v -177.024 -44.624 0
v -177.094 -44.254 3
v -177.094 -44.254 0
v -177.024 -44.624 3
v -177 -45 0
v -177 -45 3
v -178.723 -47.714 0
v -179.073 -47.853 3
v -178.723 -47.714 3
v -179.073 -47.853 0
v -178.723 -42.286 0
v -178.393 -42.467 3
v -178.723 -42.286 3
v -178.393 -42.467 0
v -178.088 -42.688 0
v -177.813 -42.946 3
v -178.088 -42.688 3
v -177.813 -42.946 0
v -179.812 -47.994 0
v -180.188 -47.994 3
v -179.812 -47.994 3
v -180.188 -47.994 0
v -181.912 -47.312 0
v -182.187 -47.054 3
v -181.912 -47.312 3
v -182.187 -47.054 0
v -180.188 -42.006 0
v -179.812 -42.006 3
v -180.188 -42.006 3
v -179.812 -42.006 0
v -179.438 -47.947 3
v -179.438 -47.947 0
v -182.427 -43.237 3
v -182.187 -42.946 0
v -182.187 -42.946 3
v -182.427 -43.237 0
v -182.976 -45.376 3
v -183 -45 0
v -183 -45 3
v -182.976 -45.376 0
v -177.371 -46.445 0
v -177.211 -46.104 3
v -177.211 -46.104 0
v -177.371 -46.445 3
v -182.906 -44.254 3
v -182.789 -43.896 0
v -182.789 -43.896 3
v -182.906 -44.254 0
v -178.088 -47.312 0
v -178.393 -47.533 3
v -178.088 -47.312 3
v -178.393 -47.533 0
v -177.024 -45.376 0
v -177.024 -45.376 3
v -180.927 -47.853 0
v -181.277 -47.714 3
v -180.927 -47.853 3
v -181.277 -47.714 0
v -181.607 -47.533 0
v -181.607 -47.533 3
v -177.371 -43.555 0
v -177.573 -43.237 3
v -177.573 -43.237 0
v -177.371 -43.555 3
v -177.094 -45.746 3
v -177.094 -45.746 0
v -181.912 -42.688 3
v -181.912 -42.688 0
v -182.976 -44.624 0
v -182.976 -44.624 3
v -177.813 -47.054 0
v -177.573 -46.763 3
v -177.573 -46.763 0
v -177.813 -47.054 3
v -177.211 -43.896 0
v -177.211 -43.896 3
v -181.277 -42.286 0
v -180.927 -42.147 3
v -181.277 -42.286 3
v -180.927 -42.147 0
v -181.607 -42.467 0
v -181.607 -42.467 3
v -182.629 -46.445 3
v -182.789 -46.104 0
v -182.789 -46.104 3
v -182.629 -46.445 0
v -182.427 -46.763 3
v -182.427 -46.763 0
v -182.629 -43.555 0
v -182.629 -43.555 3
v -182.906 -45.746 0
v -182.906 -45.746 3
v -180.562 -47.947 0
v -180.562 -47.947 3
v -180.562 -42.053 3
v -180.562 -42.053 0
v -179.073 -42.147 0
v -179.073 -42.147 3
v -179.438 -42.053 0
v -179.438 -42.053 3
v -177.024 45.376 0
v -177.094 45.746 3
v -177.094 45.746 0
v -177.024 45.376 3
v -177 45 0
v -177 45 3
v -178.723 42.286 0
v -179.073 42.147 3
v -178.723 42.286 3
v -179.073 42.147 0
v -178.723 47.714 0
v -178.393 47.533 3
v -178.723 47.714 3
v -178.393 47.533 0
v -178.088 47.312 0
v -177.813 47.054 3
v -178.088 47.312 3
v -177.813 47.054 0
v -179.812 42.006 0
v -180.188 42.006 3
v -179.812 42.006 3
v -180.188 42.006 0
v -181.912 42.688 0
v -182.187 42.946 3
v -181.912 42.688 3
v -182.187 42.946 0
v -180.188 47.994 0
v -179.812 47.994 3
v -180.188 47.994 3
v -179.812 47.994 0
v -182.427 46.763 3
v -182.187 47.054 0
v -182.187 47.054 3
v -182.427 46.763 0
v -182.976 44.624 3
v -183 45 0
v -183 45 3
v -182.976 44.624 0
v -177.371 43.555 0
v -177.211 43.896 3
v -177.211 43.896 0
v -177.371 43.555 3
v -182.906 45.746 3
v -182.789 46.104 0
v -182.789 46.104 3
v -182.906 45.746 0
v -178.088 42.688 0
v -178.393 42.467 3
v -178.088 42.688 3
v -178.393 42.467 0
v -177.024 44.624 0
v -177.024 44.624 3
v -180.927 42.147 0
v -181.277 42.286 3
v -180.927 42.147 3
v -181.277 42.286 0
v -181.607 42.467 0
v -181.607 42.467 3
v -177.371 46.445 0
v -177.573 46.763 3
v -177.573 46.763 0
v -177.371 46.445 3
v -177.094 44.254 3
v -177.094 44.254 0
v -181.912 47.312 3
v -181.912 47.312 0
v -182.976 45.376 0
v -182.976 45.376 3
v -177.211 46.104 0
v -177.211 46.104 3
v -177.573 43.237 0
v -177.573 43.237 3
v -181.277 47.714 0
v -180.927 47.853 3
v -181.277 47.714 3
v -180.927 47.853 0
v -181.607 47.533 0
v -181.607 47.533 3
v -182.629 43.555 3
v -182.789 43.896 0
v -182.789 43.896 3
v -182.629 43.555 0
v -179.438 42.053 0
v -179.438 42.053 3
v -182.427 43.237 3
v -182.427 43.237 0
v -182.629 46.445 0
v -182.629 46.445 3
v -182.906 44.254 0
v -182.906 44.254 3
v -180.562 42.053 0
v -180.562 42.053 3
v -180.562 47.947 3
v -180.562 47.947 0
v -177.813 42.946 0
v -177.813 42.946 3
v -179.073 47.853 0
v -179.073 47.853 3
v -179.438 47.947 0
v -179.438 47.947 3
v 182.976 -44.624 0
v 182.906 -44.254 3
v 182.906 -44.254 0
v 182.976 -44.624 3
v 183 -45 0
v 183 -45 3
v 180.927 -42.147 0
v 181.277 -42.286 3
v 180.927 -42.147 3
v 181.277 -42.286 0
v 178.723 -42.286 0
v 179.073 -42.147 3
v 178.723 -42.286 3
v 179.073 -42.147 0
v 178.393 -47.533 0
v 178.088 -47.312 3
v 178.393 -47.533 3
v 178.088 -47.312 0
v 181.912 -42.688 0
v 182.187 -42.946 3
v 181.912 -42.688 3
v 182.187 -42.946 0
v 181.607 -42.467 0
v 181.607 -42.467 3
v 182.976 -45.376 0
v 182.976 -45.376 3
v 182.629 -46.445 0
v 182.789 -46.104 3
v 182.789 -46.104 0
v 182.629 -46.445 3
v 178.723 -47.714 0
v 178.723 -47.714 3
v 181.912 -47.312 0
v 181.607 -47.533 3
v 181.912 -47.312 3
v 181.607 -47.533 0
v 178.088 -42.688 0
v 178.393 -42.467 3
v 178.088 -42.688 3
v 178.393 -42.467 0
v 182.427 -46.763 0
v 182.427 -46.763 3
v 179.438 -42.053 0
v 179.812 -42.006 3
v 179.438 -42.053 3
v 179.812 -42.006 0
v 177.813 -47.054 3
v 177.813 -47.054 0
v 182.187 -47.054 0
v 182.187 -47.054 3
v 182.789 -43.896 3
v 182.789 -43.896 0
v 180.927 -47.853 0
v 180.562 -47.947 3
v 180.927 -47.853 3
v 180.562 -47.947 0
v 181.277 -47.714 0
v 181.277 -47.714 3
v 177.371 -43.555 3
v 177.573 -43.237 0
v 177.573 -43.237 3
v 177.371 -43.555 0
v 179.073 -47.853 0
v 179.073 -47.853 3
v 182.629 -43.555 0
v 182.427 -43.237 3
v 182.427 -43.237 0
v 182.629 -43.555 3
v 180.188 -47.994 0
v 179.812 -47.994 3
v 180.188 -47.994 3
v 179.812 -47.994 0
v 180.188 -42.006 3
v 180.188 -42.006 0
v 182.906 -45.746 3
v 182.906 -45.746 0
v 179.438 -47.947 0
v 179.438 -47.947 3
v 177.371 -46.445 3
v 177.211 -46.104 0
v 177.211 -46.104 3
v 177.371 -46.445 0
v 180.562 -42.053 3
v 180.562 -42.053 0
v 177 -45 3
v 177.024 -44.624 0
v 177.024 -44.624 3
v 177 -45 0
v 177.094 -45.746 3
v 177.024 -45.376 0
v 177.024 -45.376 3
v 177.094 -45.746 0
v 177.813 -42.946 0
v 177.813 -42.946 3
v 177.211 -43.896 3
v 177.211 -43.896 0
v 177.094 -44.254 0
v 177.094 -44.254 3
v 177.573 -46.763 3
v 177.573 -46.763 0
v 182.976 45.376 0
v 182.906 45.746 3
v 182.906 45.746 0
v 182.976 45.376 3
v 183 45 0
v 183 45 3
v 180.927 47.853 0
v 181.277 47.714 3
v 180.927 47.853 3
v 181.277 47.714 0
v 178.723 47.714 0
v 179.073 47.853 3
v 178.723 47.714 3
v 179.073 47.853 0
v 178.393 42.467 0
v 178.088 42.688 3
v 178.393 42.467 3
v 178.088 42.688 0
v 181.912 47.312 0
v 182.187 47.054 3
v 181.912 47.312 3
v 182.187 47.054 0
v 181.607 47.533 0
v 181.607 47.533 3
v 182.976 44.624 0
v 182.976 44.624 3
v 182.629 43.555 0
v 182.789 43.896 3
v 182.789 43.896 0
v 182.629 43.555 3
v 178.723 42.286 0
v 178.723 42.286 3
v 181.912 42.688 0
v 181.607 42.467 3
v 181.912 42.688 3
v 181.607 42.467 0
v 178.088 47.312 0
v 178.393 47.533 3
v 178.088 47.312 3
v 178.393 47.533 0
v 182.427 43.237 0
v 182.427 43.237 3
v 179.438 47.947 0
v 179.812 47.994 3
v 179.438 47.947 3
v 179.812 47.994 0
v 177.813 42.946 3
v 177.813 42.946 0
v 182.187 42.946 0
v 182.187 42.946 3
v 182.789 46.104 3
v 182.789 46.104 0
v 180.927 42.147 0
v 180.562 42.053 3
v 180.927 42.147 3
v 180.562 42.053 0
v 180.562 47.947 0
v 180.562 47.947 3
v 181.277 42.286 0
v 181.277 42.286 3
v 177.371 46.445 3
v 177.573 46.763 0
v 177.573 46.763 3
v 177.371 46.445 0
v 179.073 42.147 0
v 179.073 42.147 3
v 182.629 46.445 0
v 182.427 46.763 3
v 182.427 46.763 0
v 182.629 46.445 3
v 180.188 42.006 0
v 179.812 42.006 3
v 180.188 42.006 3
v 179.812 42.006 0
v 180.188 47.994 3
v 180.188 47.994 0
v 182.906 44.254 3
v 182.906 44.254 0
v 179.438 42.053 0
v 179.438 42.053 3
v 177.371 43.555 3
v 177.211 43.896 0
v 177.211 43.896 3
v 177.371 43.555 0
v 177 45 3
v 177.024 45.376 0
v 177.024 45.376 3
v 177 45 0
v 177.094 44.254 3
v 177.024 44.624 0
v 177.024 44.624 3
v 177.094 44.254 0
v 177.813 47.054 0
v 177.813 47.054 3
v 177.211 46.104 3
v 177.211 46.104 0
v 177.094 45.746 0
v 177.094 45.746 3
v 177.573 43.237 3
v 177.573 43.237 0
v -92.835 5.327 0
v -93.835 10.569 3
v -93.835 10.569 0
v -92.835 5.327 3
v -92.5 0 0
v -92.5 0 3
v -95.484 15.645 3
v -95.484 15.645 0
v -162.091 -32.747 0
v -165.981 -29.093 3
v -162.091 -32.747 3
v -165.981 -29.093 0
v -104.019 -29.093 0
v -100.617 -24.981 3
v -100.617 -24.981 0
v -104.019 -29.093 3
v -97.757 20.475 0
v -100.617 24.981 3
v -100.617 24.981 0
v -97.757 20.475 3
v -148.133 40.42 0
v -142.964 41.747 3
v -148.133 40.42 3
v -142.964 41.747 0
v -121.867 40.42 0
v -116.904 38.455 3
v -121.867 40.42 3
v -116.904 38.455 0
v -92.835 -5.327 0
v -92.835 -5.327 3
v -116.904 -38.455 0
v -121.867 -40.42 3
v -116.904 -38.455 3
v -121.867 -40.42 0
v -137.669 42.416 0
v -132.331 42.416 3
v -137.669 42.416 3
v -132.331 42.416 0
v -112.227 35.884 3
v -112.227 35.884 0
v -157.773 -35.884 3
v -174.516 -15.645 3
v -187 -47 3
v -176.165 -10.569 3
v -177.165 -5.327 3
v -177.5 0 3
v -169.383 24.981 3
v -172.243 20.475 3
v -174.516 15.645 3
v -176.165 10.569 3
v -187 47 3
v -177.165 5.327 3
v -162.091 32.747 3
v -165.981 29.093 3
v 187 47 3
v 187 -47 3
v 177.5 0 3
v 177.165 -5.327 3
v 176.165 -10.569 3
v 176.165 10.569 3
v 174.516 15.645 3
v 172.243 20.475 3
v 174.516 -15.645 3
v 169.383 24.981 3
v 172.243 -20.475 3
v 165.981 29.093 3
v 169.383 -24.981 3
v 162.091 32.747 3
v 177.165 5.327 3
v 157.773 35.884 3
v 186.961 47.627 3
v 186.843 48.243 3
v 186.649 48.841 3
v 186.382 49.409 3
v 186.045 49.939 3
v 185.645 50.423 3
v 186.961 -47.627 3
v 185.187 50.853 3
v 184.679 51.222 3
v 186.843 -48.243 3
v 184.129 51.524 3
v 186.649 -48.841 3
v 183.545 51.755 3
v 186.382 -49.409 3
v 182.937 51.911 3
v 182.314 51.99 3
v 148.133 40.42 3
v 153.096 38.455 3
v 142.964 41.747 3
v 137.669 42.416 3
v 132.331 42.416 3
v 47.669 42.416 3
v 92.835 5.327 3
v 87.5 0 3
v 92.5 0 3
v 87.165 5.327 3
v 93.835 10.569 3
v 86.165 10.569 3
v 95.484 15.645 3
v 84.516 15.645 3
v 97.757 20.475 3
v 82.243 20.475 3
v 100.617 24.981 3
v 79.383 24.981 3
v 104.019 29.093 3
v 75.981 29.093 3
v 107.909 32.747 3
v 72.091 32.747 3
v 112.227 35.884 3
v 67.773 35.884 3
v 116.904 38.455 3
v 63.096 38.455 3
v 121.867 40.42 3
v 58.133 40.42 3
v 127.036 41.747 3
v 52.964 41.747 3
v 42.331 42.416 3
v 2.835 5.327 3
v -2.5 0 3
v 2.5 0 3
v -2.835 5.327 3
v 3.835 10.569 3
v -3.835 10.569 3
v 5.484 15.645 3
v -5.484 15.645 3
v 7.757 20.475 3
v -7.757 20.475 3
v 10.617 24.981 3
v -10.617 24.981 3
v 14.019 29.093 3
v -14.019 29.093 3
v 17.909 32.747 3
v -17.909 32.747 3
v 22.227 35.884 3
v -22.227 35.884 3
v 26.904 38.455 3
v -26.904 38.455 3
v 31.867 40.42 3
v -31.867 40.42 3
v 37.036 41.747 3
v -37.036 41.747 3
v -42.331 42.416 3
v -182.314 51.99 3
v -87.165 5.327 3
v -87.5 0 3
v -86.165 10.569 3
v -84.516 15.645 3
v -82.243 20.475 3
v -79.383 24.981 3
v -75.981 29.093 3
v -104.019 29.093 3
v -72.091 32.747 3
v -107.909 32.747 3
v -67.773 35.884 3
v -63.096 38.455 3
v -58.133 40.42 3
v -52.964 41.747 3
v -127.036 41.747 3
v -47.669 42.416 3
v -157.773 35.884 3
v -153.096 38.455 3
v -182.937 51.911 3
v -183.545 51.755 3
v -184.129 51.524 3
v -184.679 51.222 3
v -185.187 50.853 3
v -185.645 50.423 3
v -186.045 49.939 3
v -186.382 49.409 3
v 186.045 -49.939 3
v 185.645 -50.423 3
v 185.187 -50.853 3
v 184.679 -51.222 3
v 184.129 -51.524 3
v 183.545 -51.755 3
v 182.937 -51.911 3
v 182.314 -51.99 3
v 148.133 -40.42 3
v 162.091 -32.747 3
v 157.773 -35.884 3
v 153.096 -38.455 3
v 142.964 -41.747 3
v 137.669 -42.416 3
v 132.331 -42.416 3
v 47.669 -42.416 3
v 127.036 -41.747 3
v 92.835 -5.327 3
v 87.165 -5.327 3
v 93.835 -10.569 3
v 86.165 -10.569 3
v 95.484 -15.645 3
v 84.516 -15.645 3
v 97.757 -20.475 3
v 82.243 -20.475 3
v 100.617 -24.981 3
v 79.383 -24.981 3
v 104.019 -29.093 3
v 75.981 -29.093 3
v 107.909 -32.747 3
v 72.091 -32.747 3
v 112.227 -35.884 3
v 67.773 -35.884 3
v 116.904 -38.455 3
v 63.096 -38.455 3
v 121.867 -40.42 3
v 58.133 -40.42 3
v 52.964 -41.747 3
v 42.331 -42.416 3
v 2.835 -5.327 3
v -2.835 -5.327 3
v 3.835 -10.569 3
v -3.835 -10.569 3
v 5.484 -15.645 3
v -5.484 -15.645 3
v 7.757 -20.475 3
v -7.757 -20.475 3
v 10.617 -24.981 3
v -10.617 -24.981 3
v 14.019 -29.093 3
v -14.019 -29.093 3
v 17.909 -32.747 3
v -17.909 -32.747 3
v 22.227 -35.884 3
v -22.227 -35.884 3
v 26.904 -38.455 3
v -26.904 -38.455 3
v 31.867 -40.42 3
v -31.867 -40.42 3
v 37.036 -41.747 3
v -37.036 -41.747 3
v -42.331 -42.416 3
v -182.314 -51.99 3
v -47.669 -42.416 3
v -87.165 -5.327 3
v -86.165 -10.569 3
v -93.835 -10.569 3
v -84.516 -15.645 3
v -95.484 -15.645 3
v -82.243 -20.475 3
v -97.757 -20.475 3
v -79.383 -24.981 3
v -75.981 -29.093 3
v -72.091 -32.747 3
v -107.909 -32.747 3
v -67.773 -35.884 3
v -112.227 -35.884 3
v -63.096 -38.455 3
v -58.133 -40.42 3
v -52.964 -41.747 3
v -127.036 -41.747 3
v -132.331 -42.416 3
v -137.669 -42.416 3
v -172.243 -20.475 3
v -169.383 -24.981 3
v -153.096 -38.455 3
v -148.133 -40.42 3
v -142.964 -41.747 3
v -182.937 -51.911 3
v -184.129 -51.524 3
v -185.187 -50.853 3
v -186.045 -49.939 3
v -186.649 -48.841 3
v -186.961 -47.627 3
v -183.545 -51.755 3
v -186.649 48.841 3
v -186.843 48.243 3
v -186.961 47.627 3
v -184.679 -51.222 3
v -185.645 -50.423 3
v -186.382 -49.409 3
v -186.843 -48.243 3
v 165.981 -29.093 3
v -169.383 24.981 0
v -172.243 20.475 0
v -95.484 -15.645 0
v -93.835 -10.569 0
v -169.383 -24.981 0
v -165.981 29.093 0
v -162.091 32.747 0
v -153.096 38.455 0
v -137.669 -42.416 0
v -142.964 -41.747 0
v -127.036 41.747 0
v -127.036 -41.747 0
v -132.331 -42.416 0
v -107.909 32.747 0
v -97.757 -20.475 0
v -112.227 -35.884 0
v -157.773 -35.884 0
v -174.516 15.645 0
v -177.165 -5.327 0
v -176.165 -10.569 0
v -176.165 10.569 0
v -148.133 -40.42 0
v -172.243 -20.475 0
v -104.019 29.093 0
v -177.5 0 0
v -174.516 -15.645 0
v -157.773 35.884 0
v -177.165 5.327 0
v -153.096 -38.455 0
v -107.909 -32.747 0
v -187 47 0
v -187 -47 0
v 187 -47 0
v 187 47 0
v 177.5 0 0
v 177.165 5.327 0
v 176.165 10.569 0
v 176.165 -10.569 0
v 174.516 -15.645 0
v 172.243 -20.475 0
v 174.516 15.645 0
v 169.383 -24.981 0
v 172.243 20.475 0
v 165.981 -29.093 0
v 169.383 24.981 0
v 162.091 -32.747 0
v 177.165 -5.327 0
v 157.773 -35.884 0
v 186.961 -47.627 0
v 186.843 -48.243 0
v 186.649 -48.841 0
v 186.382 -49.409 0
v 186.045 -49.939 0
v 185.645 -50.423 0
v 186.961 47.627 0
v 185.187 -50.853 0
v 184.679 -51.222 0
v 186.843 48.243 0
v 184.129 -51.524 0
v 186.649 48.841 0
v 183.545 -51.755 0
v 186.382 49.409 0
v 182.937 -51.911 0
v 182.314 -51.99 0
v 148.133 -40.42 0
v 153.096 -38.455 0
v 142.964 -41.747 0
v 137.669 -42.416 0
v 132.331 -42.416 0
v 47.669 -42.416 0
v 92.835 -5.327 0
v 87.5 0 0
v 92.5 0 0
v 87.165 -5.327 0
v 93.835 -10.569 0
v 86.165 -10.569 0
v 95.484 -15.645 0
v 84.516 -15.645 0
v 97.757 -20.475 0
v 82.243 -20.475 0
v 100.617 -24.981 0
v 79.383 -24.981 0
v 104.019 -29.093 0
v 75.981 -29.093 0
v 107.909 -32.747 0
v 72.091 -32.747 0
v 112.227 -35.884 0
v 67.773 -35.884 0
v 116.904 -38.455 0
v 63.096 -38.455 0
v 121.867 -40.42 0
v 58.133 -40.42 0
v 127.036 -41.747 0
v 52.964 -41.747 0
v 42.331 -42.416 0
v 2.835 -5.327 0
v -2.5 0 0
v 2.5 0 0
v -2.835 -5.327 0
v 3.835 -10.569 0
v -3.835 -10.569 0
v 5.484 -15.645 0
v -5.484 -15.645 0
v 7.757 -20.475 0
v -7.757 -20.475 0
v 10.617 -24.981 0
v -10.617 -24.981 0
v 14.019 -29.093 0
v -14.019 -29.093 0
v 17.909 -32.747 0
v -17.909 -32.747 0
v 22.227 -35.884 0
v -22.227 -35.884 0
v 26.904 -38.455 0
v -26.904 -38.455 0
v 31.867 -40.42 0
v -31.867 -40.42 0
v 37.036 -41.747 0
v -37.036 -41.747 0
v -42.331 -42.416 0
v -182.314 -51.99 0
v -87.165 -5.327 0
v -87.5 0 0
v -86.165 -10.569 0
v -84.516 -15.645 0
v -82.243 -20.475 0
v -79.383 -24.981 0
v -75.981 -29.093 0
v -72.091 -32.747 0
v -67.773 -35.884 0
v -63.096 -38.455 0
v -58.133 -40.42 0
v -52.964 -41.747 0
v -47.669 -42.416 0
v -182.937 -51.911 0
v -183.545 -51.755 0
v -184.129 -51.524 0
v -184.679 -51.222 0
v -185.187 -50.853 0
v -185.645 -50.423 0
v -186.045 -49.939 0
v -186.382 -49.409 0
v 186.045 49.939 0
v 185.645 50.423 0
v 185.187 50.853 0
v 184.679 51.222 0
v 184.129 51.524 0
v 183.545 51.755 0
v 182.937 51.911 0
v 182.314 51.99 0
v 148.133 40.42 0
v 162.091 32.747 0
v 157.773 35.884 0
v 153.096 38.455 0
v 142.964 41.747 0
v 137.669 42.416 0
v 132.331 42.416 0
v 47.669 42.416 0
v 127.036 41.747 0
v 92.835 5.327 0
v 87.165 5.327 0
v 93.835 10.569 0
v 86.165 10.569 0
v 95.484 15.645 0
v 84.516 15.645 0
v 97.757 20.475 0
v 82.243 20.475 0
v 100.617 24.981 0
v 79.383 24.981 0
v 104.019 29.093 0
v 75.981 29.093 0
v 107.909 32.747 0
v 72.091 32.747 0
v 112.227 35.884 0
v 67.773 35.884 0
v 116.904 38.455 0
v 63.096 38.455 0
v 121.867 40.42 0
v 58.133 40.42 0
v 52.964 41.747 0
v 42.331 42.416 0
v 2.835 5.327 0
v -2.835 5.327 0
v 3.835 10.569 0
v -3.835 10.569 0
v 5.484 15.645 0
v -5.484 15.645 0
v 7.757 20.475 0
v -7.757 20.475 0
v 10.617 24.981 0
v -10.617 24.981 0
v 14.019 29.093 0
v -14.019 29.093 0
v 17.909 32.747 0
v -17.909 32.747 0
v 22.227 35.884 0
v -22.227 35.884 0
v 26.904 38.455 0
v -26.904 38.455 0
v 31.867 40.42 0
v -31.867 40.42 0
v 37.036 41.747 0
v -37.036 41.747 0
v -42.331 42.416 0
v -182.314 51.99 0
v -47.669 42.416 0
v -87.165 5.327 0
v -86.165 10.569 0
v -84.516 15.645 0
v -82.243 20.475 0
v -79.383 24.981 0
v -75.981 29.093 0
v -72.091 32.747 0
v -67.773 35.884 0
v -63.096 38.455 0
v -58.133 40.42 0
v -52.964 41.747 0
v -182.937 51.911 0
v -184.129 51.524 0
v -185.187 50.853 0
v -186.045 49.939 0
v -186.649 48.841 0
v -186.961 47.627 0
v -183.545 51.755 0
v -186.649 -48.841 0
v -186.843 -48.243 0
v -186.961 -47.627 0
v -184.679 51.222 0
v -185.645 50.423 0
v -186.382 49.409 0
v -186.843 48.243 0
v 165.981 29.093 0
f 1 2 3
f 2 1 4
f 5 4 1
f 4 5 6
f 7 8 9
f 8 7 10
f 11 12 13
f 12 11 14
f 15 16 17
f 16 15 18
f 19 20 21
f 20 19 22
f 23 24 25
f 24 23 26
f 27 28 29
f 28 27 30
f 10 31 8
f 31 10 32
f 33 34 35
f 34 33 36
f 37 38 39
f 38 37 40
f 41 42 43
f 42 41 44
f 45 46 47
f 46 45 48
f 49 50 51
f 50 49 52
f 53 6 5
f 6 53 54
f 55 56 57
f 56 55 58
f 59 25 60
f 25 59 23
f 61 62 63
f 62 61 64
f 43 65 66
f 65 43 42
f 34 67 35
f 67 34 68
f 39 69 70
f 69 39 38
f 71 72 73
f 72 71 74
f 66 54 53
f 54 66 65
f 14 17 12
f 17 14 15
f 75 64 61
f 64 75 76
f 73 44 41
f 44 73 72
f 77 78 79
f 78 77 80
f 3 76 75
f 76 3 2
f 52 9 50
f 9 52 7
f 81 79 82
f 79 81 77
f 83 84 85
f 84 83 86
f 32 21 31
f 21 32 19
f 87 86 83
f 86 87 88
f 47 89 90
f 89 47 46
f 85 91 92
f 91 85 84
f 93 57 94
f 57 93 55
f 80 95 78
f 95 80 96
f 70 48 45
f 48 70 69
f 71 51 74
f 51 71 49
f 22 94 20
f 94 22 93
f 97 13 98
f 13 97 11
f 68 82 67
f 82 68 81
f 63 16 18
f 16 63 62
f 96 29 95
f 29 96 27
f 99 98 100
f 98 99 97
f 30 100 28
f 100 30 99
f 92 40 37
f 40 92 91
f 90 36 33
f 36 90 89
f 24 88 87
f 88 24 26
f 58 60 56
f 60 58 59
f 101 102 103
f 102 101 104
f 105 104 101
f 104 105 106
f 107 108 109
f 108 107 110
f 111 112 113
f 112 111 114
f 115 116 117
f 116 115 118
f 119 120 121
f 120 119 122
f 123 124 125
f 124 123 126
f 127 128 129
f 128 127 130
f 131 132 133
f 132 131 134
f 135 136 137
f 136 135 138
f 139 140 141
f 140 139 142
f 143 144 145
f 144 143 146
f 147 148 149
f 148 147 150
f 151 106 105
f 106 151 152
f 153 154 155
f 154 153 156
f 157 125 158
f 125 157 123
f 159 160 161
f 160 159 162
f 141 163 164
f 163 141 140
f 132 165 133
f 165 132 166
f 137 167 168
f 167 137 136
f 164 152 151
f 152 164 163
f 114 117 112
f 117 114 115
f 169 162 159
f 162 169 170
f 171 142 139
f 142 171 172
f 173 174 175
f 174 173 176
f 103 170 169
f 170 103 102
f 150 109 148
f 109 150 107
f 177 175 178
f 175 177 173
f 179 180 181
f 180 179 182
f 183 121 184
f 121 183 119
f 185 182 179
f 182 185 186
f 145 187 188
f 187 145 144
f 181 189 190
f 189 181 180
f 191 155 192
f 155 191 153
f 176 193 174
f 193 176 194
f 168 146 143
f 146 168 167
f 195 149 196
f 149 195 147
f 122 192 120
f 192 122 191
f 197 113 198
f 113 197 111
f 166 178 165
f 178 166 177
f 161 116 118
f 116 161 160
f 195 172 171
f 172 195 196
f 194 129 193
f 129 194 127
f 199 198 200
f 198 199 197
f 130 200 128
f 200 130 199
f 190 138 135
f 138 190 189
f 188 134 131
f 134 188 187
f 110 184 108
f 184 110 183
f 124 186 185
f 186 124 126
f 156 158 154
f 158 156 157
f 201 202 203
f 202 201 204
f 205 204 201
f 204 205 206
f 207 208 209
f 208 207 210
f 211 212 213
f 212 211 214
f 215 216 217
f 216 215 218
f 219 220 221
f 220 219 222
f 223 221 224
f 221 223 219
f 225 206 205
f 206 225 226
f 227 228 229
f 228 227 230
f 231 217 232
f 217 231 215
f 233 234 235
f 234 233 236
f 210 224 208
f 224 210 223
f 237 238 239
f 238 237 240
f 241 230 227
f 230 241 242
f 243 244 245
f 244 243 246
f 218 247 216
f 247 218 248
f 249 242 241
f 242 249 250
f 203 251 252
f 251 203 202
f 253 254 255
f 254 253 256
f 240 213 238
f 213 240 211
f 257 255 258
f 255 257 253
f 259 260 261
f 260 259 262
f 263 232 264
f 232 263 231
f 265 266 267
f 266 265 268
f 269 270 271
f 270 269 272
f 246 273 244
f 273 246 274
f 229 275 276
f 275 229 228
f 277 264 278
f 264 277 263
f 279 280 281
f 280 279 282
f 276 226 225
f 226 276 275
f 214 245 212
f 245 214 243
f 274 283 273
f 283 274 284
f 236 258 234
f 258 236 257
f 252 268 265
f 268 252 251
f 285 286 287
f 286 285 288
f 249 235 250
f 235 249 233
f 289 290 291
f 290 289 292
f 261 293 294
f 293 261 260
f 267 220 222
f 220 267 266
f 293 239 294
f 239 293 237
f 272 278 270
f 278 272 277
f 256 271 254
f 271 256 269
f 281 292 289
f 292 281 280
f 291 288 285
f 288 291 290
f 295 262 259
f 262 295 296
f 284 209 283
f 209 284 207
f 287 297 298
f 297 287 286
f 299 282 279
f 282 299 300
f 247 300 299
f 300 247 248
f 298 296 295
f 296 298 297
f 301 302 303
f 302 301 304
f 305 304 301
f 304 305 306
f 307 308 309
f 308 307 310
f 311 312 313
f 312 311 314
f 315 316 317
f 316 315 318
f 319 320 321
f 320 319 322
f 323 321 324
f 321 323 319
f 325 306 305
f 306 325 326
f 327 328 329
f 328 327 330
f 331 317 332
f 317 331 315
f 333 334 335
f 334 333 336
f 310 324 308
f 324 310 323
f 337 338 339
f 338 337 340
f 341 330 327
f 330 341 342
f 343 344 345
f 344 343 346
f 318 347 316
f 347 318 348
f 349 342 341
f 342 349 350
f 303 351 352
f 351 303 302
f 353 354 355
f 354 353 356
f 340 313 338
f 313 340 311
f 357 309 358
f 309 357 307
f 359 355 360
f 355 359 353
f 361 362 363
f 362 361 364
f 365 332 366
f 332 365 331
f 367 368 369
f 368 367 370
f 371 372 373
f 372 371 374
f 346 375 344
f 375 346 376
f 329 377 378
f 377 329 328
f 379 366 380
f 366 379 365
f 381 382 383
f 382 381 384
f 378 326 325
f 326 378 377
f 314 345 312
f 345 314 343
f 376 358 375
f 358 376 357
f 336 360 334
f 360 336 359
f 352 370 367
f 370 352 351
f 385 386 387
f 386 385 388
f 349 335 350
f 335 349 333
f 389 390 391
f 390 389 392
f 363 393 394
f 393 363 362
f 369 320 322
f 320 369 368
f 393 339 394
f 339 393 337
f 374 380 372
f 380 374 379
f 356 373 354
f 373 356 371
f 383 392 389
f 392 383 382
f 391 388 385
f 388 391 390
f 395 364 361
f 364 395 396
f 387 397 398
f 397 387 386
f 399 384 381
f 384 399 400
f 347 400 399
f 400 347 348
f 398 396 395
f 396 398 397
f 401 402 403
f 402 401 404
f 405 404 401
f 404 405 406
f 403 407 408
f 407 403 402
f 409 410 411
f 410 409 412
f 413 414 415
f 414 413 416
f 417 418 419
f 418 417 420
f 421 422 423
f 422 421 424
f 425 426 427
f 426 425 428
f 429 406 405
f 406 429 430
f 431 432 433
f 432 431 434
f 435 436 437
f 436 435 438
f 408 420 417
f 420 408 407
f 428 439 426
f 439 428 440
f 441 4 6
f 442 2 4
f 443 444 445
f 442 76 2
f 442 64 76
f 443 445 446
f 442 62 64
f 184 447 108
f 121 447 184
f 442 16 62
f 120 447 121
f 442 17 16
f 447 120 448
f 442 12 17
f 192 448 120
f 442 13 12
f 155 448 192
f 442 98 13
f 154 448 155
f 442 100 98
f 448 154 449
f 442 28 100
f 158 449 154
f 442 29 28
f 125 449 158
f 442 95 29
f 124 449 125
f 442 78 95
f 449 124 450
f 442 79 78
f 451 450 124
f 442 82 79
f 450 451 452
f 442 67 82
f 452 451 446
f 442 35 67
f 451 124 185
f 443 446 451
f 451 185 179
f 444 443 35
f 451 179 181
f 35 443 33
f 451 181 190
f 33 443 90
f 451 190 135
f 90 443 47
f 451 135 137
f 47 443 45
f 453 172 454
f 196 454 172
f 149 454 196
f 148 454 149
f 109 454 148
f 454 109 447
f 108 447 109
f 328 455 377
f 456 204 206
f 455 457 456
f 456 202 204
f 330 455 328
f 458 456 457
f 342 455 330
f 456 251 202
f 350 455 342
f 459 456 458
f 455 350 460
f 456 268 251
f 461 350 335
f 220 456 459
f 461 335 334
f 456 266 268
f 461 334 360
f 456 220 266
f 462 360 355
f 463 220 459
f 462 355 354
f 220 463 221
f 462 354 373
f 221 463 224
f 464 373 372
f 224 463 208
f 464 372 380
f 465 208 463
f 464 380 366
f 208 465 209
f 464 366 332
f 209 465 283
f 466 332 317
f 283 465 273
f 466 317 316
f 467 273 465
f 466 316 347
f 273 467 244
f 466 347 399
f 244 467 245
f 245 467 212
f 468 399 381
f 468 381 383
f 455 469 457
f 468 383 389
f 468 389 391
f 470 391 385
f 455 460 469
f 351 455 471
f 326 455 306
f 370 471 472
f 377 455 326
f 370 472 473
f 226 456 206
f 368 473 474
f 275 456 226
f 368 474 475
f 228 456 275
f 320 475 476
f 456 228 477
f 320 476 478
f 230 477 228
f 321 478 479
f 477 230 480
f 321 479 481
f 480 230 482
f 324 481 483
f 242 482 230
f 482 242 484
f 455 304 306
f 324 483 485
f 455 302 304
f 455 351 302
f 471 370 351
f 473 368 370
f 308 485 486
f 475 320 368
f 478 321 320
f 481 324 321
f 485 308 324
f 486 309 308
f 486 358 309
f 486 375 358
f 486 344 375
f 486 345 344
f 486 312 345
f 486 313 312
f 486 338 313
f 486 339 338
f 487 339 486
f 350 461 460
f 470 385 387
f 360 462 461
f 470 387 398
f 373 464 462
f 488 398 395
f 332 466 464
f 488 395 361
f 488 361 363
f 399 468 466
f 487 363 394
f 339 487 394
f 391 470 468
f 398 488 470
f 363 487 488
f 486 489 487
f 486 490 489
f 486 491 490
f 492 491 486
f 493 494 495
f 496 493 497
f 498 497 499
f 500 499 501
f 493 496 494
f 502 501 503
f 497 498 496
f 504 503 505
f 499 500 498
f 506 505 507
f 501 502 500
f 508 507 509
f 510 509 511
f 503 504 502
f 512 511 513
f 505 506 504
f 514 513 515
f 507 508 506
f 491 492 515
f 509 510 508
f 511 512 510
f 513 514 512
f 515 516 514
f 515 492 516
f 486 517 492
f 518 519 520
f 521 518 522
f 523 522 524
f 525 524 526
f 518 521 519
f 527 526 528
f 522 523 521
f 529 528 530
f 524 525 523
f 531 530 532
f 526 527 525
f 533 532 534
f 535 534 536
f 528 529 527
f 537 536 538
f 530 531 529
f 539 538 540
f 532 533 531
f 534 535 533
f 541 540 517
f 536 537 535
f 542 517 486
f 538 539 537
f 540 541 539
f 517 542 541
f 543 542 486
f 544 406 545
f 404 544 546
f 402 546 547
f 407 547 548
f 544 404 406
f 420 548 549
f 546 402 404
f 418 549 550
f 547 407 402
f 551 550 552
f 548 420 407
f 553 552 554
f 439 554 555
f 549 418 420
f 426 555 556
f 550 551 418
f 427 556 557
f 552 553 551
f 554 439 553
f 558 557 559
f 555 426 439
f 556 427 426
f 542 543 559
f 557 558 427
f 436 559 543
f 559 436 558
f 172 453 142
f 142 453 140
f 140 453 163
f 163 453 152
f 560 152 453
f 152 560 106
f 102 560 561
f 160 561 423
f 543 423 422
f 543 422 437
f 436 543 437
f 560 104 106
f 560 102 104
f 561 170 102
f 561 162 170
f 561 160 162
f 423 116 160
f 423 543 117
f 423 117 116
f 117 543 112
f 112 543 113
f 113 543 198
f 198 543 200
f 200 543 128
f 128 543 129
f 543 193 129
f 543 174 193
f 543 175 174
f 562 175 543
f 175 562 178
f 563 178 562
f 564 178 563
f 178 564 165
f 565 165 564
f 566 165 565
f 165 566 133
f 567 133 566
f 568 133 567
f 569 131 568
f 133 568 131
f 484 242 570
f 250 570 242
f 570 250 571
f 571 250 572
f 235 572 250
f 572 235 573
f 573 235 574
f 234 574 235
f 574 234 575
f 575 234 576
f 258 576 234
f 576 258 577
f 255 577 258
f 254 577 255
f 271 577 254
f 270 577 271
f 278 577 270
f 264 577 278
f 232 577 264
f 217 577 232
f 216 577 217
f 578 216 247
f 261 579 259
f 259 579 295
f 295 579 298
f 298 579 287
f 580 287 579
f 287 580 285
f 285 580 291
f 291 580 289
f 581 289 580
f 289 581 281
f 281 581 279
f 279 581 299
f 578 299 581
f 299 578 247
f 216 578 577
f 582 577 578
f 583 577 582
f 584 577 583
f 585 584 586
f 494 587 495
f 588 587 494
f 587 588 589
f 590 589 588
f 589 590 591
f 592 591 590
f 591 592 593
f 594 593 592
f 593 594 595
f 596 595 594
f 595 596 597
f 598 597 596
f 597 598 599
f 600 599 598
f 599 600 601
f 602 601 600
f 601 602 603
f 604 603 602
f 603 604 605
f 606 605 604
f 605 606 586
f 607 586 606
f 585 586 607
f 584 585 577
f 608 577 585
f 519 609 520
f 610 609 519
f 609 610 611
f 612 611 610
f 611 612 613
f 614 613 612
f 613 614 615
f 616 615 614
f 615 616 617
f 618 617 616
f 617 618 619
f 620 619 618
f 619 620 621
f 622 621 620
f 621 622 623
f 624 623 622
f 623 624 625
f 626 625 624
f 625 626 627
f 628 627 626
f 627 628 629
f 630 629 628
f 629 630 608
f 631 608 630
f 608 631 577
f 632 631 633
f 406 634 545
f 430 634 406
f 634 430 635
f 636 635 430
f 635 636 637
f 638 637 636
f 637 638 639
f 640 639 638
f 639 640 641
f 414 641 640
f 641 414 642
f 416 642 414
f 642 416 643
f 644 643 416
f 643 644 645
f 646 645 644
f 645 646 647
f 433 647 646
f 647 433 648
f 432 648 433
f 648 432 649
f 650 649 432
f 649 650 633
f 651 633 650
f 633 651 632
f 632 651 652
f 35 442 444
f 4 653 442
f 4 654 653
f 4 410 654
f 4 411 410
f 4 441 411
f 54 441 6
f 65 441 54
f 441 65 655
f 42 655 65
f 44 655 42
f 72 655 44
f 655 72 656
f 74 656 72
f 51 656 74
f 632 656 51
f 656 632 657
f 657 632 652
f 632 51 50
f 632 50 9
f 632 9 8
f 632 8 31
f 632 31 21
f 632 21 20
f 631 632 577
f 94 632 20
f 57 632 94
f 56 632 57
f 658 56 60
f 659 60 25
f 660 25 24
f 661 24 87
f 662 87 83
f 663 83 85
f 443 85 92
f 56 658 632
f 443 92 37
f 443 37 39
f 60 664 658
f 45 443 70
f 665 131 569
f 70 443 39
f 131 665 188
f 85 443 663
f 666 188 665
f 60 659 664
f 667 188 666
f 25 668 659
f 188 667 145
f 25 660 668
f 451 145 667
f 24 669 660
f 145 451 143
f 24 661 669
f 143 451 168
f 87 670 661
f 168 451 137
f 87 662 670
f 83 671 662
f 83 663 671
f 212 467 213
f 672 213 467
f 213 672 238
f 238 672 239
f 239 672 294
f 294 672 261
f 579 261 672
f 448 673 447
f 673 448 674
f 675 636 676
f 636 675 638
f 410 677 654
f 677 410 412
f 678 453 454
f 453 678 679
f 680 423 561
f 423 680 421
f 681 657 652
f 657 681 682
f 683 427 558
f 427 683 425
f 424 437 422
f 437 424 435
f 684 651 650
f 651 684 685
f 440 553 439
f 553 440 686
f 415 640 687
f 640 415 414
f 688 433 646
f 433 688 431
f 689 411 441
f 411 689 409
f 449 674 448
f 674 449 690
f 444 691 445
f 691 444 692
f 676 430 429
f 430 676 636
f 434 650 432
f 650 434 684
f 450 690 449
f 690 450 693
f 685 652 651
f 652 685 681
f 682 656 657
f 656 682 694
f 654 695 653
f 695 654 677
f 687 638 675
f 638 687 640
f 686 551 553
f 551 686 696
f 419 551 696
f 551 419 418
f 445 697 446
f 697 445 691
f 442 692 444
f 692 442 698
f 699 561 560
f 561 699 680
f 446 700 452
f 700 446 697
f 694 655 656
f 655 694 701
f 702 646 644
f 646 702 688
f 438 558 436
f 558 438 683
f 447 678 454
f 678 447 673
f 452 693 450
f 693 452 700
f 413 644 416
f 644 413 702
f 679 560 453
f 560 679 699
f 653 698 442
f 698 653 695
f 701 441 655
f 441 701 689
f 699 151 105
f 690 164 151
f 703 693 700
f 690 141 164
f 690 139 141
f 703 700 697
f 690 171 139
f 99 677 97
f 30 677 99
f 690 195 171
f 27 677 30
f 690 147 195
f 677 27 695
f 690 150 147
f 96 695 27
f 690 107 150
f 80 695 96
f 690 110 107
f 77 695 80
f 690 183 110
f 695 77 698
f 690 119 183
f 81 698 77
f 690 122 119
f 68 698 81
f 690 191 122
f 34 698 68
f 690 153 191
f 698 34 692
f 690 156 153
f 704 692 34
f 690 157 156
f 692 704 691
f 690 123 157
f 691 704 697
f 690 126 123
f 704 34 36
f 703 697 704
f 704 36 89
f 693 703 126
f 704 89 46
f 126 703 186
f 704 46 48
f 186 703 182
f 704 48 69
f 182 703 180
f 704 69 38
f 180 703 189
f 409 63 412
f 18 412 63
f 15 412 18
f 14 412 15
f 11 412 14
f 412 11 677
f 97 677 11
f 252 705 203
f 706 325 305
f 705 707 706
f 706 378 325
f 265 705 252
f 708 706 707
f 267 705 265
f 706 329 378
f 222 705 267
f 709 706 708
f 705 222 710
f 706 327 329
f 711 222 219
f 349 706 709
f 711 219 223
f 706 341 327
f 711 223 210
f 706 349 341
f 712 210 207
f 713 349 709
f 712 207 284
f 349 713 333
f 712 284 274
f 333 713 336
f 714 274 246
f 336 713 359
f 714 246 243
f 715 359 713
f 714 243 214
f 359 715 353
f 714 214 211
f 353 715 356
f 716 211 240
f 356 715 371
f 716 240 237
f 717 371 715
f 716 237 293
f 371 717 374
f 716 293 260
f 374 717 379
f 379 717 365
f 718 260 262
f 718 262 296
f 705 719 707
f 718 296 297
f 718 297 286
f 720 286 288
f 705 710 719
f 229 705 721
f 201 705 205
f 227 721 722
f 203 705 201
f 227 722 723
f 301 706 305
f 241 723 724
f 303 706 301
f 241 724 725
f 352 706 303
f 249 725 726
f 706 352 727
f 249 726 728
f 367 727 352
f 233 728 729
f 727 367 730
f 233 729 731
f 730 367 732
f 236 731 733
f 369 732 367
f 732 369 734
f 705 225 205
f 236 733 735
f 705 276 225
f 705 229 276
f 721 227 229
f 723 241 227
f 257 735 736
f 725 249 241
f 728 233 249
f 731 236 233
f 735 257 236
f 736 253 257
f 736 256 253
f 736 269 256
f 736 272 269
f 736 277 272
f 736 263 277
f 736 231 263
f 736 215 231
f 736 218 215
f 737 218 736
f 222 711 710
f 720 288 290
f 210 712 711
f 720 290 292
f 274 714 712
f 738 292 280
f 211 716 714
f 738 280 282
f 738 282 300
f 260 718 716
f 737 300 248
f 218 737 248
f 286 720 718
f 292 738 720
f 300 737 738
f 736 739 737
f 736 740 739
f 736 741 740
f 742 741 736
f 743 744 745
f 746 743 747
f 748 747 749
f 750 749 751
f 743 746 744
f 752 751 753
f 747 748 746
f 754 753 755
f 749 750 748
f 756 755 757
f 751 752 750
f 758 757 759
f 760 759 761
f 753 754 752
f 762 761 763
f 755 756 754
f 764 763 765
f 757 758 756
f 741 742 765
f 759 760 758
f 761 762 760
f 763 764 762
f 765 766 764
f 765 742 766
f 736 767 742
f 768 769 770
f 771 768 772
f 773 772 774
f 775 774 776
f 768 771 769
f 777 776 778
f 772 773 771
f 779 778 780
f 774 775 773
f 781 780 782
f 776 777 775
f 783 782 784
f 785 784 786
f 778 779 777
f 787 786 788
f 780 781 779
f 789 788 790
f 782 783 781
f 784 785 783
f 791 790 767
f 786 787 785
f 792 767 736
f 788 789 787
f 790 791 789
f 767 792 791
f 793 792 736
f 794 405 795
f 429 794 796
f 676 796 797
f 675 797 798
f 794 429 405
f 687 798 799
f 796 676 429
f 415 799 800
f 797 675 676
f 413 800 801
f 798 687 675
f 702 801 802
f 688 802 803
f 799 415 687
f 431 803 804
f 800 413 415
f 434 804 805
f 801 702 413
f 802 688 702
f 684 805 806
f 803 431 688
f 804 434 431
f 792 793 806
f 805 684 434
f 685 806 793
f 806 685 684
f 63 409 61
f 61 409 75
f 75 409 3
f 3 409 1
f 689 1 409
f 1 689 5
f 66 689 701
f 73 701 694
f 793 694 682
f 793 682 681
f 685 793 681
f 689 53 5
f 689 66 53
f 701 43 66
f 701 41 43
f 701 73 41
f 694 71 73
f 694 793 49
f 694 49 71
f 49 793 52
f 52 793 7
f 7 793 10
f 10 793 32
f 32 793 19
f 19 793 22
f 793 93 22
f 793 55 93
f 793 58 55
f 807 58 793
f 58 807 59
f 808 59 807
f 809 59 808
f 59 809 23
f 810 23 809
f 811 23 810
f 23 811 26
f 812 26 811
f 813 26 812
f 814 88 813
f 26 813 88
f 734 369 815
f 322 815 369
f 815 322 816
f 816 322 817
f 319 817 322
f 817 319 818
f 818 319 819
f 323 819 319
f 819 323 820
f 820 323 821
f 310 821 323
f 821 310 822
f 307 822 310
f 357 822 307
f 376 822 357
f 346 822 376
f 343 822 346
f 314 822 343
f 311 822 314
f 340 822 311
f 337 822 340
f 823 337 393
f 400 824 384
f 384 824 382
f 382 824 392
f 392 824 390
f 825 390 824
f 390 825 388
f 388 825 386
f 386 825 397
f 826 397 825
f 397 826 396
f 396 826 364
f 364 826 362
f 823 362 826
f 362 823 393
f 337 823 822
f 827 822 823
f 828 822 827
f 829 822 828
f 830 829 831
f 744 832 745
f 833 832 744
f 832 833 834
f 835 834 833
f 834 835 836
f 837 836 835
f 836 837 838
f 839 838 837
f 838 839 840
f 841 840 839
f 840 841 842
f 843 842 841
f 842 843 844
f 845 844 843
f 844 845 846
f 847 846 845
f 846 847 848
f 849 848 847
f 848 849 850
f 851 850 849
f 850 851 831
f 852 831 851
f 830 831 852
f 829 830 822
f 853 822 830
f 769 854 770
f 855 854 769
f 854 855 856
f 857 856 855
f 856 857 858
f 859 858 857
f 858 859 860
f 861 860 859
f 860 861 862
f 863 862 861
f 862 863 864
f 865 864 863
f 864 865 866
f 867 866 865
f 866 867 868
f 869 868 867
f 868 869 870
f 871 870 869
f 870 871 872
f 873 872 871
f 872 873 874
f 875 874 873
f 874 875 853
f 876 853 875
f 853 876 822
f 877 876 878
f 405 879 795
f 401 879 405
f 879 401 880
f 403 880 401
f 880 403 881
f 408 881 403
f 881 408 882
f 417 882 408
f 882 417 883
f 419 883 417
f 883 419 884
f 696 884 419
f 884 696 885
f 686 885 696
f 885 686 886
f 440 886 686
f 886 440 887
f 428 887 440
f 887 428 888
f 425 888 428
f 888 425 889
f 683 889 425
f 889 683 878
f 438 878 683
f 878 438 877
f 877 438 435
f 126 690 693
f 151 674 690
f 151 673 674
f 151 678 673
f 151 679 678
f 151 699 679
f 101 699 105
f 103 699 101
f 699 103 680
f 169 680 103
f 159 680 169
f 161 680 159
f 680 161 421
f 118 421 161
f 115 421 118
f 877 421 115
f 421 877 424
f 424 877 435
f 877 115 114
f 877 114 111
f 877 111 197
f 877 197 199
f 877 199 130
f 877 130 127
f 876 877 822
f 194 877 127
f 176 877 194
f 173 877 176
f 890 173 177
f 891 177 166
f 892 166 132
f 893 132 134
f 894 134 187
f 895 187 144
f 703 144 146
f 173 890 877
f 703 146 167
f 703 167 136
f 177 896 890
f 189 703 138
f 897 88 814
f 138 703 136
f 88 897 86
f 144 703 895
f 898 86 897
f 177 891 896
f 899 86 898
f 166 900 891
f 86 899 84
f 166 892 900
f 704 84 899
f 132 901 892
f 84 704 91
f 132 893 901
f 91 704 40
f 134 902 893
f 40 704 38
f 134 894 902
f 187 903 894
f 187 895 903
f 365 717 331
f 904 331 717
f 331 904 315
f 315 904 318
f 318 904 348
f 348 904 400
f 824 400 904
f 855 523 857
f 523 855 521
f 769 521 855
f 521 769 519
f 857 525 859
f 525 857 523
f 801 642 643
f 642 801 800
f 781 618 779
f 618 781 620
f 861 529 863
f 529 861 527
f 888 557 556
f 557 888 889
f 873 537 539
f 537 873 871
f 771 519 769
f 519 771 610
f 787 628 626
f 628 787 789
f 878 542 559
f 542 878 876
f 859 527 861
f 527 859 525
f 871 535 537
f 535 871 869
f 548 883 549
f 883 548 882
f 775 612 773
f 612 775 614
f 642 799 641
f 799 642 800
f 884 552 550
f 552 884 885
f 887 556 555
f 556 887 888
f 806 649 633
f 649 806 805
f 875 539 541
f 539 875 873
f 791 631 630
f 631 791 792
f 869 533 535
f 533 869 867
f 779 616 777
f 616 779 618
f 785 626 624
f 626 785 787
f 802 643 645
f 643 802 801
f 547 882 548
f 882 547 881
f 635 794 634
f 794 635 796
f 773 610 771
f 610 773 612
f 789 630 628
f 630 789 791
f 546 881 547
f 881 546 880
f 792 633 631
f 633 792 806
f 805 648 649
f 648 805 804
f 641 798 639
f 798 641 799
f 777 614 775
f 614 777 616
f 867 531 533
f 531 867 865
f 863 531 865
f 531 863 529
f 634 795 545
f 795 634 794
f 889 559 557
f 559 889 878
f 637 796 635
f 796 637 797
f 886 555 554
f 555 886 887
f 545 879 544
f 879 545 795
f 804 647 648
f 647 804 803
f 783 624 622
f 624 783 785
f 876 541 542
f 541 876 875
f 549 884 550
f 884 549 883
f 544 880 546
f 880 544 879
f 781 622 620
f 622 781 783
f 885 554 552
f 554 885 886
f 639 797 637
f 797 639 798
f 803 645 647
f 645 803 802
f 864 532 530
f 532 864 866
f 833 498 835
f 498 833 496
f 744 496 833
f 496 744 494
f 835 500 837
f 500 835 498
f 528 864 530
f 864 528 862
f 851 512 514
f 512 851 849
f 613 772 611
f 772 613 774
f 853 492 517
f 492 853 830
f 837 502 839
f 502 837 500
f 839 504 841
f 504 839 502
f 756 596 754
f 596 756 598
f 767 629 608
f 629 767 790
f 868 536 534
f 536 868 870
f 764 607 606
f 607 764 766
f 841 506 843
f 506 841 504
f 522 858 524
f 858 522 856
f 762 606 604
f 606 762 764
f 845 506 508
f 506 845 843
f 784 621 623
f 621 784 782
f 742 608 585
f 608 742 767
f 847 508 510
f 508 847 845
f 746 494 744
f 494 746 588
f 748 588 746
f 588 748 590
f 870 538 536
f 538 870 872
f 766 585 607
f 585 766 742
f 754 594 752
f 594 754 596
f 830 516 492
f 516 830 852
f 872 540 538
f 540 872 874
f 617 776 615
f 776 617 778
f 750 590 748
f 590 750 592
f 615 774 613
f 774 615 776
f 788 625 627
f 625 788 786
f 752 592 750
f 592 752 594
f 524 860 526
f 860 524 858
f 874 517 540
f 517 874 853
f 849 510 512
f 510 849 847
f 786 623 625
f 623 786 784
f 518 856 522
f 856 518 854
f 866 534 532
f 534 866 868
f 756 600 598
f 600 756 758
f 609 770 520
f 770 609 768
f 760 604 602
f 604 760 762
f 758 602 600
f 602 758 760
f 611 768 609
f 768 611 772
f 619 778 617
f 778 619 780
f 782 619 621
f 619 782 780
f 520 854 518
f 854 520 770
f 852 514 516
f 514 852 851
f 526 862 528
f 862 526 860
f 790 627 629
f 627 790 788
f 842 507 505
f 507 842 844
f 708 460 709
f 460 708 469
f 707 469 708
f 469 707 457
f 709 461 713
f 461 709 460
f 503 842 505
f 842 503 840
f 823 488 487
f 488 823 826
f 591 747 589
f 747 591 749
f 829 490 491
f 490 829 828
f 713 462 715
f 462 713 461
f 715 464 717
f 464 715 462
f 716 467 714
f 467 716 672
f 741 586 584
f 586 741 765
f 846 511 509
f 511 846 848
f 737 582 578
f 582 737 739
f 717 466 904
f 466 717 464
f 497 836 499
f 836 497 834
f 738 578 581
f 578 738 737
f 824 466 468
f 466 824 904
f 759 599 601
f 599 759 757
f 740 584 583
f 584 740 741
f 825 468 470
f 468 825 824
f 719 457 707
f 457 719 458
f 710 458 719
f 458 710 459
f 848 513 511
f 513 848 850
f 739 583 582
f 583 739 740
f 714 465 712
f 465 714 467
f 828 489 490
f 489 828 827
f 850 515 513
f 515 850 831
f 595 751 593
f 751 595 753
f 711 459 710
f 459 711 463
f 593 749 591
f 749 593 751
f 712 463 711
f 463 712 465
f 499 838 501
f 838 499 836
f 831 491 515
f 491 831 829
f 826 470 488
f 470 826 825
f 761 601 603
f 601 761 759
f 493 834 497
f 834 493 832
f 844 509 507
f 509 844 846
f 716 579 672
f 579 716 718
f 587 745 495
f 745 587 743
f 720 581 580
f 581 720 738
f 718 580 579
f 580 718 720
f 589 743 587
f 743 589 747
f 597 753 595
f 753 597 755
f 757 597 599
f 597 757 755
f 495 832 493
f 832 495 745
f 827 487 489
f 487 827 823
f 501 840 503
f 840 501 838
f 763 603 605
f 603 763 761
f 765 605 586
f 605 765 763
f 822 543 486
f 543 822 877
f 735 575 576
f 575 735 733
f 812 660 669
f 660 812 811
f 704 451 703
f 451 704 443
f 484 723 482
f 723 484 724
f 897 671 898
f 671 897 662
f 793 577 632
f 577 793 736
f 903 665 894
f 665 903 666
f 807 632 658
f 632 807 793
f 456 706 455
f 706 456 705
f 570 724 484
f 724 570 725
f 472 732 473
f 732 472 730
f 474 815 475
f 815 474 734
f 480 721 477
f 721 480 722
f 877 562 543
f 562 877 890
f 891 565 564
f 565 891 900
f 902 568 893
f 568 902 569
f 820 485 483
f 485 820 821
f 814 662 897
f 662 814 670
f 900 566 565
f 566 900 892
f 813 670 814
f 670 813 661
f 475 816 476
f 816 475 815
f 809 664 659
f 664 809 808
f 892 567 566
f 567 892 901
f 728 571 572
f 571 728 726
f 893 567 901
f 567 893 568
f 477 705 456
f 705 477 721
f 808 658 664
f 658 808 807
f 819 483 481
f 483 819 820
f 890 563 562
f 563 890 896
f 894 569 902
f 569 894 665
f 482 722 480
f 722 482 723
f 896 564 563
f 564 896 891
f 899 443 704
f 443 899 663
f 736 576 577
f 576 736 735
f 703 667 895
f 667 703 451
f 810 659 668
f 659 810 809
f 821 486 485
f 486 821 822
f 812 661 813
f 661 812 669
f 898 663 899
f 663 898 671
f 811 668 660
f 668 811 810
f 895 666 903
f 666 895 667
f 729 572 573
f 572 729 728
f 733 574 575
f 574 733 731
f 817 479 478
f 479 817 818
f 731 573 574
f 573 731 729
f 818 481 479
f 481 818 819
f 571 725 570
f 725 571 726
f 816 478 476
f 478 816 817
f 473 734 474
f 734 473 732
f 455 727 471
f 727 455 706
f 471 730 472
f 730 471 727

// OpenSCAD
$fn = 50;


difference() {
	union() {
		hull() {
			translate(v = [-182.0000000000, 47.0000000000, 0]) {
				cylinder(h = 3, r = 5);
			}
			translate(v = [182.0000000000, 47.0000000000, 0]) {
				cylinder(h = 3, r = 5);
			}
			translate(v = [-182.0000000000, -47.0000000000, 0]) {
				cylinder(h = 3, r = 5);
			}
			translate(v = [182.0000000000, -47.0000000000, 0]) {
				cylinder(h = 3, r = 5);
			}
		}
	}
	union() {
		#translate(v = [-180.0000000000, -45.0000000000, -100.0000000000]) {
			cylinder(h = 200, r = 3.0000000000);
		}
		#translate(v = [-180.0000000000, 45.0000000000, -100.0000000000]) {
			cylinder(h = 200, r = 3.0000000000);
		}
		#translate(v = [180.0000000000, -45.0000000000, -100.0000000000]) {
			cylinder(h = 200, r = 3.0000000000);
		}
		#translate(v = [180.0000000000, 45.0000000000, -100.0000000000]) {
			cylinder(h = 200, r = 3.0000000000);
		}
		#translate(v = [-135.0000000000, 0, 0]) {
			cylinder(h = 3, r = 42.5000000000);
		}
		#translate(v = [-45.0000000000, 0, 0]) {
			cylinder(h = 3, r = 42.5000000000);
		}
		#translate(v = [45.0000000000, 0, 0]) {
			cylinder(h = 3, r = 42.5000000000);
		}
		#translate(v = [135.0000000000, 0, 0]) {
			cylinder(h = 3, r = 42.5000000000);
		}
	}
}
